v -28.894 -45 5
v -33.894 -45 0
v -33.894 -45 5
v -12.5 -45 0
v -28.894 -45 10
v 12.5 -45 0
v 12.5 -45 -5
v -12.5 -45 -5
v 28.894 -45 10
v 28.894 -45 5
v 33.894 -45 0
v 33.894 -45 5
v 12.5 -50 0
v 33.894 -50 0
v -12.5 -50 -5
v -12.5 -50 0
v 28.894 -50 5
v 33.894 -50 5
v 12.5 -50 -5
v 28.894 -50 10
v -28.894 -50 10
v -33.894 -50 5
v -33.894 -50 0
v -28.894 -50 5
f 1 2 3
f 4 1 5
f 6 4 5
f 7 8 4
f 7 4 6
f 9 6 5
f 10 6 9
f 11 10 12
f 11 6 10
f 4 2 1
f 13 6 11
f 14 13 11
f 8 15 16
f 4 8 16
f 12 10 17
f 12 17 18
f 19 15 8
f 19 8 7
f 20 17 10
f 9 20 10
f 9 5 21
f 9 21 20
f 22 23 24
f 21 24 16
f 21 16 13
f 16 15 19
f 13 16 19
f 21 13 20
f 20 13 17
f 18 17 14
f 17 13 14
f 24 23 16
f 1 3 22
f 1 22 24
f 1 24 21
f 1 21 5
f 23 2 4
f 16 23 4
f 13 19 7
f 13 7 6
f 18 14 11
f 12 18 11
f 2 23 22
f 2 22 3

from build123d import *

# Parameters (mm, degrees)
SKETCH1_W           = 67.788084332
SKETCH1_H           = 5
BOSS_EXTRUDE1_DEPTH = 5
SKETCH2_W           = 57.788084332
SKETCH2_H           = 5
BOSS_EXTRUDE2_DEPTH = 5
SKETCH3_W           = 25
SKETCH3_H           = 5
BOSS_EXTRUDE3_DEPTH = 5


with BuildPart() as part:
    # Sketch1 → Boss-Extrude1 (new body)
    with BuildSketch(Plane.XY):
        with Locations((0, -47.5)):
            Rectangle(SKETCH1_W, SKETCH1_H)
    extrude(amount=BOSS_EXTRUDE1_DEPTH)

    # Sketch2 → Boss-Extrude2 (add)
    with BuildSketch(Plane.XY.offset(5)):
        with Locations((0, -47.5)):
            Rectangle(SKETCH2_W, SKETCH2_H)
    extrude(amount=BOSS_EXTRUDE2_DEPTH)

    # Sketch3 → Boss-Extrude3 (add)
    with BuildSketch(Plane.XZ.offset(50)):
        with Locations((0, -2.5)):
            Rectangle(SKETCH3_W, SKETCH3_H)
    extrude(amount=-BOSS_EXTRUDE3_DEPTH)


solid = part.part
